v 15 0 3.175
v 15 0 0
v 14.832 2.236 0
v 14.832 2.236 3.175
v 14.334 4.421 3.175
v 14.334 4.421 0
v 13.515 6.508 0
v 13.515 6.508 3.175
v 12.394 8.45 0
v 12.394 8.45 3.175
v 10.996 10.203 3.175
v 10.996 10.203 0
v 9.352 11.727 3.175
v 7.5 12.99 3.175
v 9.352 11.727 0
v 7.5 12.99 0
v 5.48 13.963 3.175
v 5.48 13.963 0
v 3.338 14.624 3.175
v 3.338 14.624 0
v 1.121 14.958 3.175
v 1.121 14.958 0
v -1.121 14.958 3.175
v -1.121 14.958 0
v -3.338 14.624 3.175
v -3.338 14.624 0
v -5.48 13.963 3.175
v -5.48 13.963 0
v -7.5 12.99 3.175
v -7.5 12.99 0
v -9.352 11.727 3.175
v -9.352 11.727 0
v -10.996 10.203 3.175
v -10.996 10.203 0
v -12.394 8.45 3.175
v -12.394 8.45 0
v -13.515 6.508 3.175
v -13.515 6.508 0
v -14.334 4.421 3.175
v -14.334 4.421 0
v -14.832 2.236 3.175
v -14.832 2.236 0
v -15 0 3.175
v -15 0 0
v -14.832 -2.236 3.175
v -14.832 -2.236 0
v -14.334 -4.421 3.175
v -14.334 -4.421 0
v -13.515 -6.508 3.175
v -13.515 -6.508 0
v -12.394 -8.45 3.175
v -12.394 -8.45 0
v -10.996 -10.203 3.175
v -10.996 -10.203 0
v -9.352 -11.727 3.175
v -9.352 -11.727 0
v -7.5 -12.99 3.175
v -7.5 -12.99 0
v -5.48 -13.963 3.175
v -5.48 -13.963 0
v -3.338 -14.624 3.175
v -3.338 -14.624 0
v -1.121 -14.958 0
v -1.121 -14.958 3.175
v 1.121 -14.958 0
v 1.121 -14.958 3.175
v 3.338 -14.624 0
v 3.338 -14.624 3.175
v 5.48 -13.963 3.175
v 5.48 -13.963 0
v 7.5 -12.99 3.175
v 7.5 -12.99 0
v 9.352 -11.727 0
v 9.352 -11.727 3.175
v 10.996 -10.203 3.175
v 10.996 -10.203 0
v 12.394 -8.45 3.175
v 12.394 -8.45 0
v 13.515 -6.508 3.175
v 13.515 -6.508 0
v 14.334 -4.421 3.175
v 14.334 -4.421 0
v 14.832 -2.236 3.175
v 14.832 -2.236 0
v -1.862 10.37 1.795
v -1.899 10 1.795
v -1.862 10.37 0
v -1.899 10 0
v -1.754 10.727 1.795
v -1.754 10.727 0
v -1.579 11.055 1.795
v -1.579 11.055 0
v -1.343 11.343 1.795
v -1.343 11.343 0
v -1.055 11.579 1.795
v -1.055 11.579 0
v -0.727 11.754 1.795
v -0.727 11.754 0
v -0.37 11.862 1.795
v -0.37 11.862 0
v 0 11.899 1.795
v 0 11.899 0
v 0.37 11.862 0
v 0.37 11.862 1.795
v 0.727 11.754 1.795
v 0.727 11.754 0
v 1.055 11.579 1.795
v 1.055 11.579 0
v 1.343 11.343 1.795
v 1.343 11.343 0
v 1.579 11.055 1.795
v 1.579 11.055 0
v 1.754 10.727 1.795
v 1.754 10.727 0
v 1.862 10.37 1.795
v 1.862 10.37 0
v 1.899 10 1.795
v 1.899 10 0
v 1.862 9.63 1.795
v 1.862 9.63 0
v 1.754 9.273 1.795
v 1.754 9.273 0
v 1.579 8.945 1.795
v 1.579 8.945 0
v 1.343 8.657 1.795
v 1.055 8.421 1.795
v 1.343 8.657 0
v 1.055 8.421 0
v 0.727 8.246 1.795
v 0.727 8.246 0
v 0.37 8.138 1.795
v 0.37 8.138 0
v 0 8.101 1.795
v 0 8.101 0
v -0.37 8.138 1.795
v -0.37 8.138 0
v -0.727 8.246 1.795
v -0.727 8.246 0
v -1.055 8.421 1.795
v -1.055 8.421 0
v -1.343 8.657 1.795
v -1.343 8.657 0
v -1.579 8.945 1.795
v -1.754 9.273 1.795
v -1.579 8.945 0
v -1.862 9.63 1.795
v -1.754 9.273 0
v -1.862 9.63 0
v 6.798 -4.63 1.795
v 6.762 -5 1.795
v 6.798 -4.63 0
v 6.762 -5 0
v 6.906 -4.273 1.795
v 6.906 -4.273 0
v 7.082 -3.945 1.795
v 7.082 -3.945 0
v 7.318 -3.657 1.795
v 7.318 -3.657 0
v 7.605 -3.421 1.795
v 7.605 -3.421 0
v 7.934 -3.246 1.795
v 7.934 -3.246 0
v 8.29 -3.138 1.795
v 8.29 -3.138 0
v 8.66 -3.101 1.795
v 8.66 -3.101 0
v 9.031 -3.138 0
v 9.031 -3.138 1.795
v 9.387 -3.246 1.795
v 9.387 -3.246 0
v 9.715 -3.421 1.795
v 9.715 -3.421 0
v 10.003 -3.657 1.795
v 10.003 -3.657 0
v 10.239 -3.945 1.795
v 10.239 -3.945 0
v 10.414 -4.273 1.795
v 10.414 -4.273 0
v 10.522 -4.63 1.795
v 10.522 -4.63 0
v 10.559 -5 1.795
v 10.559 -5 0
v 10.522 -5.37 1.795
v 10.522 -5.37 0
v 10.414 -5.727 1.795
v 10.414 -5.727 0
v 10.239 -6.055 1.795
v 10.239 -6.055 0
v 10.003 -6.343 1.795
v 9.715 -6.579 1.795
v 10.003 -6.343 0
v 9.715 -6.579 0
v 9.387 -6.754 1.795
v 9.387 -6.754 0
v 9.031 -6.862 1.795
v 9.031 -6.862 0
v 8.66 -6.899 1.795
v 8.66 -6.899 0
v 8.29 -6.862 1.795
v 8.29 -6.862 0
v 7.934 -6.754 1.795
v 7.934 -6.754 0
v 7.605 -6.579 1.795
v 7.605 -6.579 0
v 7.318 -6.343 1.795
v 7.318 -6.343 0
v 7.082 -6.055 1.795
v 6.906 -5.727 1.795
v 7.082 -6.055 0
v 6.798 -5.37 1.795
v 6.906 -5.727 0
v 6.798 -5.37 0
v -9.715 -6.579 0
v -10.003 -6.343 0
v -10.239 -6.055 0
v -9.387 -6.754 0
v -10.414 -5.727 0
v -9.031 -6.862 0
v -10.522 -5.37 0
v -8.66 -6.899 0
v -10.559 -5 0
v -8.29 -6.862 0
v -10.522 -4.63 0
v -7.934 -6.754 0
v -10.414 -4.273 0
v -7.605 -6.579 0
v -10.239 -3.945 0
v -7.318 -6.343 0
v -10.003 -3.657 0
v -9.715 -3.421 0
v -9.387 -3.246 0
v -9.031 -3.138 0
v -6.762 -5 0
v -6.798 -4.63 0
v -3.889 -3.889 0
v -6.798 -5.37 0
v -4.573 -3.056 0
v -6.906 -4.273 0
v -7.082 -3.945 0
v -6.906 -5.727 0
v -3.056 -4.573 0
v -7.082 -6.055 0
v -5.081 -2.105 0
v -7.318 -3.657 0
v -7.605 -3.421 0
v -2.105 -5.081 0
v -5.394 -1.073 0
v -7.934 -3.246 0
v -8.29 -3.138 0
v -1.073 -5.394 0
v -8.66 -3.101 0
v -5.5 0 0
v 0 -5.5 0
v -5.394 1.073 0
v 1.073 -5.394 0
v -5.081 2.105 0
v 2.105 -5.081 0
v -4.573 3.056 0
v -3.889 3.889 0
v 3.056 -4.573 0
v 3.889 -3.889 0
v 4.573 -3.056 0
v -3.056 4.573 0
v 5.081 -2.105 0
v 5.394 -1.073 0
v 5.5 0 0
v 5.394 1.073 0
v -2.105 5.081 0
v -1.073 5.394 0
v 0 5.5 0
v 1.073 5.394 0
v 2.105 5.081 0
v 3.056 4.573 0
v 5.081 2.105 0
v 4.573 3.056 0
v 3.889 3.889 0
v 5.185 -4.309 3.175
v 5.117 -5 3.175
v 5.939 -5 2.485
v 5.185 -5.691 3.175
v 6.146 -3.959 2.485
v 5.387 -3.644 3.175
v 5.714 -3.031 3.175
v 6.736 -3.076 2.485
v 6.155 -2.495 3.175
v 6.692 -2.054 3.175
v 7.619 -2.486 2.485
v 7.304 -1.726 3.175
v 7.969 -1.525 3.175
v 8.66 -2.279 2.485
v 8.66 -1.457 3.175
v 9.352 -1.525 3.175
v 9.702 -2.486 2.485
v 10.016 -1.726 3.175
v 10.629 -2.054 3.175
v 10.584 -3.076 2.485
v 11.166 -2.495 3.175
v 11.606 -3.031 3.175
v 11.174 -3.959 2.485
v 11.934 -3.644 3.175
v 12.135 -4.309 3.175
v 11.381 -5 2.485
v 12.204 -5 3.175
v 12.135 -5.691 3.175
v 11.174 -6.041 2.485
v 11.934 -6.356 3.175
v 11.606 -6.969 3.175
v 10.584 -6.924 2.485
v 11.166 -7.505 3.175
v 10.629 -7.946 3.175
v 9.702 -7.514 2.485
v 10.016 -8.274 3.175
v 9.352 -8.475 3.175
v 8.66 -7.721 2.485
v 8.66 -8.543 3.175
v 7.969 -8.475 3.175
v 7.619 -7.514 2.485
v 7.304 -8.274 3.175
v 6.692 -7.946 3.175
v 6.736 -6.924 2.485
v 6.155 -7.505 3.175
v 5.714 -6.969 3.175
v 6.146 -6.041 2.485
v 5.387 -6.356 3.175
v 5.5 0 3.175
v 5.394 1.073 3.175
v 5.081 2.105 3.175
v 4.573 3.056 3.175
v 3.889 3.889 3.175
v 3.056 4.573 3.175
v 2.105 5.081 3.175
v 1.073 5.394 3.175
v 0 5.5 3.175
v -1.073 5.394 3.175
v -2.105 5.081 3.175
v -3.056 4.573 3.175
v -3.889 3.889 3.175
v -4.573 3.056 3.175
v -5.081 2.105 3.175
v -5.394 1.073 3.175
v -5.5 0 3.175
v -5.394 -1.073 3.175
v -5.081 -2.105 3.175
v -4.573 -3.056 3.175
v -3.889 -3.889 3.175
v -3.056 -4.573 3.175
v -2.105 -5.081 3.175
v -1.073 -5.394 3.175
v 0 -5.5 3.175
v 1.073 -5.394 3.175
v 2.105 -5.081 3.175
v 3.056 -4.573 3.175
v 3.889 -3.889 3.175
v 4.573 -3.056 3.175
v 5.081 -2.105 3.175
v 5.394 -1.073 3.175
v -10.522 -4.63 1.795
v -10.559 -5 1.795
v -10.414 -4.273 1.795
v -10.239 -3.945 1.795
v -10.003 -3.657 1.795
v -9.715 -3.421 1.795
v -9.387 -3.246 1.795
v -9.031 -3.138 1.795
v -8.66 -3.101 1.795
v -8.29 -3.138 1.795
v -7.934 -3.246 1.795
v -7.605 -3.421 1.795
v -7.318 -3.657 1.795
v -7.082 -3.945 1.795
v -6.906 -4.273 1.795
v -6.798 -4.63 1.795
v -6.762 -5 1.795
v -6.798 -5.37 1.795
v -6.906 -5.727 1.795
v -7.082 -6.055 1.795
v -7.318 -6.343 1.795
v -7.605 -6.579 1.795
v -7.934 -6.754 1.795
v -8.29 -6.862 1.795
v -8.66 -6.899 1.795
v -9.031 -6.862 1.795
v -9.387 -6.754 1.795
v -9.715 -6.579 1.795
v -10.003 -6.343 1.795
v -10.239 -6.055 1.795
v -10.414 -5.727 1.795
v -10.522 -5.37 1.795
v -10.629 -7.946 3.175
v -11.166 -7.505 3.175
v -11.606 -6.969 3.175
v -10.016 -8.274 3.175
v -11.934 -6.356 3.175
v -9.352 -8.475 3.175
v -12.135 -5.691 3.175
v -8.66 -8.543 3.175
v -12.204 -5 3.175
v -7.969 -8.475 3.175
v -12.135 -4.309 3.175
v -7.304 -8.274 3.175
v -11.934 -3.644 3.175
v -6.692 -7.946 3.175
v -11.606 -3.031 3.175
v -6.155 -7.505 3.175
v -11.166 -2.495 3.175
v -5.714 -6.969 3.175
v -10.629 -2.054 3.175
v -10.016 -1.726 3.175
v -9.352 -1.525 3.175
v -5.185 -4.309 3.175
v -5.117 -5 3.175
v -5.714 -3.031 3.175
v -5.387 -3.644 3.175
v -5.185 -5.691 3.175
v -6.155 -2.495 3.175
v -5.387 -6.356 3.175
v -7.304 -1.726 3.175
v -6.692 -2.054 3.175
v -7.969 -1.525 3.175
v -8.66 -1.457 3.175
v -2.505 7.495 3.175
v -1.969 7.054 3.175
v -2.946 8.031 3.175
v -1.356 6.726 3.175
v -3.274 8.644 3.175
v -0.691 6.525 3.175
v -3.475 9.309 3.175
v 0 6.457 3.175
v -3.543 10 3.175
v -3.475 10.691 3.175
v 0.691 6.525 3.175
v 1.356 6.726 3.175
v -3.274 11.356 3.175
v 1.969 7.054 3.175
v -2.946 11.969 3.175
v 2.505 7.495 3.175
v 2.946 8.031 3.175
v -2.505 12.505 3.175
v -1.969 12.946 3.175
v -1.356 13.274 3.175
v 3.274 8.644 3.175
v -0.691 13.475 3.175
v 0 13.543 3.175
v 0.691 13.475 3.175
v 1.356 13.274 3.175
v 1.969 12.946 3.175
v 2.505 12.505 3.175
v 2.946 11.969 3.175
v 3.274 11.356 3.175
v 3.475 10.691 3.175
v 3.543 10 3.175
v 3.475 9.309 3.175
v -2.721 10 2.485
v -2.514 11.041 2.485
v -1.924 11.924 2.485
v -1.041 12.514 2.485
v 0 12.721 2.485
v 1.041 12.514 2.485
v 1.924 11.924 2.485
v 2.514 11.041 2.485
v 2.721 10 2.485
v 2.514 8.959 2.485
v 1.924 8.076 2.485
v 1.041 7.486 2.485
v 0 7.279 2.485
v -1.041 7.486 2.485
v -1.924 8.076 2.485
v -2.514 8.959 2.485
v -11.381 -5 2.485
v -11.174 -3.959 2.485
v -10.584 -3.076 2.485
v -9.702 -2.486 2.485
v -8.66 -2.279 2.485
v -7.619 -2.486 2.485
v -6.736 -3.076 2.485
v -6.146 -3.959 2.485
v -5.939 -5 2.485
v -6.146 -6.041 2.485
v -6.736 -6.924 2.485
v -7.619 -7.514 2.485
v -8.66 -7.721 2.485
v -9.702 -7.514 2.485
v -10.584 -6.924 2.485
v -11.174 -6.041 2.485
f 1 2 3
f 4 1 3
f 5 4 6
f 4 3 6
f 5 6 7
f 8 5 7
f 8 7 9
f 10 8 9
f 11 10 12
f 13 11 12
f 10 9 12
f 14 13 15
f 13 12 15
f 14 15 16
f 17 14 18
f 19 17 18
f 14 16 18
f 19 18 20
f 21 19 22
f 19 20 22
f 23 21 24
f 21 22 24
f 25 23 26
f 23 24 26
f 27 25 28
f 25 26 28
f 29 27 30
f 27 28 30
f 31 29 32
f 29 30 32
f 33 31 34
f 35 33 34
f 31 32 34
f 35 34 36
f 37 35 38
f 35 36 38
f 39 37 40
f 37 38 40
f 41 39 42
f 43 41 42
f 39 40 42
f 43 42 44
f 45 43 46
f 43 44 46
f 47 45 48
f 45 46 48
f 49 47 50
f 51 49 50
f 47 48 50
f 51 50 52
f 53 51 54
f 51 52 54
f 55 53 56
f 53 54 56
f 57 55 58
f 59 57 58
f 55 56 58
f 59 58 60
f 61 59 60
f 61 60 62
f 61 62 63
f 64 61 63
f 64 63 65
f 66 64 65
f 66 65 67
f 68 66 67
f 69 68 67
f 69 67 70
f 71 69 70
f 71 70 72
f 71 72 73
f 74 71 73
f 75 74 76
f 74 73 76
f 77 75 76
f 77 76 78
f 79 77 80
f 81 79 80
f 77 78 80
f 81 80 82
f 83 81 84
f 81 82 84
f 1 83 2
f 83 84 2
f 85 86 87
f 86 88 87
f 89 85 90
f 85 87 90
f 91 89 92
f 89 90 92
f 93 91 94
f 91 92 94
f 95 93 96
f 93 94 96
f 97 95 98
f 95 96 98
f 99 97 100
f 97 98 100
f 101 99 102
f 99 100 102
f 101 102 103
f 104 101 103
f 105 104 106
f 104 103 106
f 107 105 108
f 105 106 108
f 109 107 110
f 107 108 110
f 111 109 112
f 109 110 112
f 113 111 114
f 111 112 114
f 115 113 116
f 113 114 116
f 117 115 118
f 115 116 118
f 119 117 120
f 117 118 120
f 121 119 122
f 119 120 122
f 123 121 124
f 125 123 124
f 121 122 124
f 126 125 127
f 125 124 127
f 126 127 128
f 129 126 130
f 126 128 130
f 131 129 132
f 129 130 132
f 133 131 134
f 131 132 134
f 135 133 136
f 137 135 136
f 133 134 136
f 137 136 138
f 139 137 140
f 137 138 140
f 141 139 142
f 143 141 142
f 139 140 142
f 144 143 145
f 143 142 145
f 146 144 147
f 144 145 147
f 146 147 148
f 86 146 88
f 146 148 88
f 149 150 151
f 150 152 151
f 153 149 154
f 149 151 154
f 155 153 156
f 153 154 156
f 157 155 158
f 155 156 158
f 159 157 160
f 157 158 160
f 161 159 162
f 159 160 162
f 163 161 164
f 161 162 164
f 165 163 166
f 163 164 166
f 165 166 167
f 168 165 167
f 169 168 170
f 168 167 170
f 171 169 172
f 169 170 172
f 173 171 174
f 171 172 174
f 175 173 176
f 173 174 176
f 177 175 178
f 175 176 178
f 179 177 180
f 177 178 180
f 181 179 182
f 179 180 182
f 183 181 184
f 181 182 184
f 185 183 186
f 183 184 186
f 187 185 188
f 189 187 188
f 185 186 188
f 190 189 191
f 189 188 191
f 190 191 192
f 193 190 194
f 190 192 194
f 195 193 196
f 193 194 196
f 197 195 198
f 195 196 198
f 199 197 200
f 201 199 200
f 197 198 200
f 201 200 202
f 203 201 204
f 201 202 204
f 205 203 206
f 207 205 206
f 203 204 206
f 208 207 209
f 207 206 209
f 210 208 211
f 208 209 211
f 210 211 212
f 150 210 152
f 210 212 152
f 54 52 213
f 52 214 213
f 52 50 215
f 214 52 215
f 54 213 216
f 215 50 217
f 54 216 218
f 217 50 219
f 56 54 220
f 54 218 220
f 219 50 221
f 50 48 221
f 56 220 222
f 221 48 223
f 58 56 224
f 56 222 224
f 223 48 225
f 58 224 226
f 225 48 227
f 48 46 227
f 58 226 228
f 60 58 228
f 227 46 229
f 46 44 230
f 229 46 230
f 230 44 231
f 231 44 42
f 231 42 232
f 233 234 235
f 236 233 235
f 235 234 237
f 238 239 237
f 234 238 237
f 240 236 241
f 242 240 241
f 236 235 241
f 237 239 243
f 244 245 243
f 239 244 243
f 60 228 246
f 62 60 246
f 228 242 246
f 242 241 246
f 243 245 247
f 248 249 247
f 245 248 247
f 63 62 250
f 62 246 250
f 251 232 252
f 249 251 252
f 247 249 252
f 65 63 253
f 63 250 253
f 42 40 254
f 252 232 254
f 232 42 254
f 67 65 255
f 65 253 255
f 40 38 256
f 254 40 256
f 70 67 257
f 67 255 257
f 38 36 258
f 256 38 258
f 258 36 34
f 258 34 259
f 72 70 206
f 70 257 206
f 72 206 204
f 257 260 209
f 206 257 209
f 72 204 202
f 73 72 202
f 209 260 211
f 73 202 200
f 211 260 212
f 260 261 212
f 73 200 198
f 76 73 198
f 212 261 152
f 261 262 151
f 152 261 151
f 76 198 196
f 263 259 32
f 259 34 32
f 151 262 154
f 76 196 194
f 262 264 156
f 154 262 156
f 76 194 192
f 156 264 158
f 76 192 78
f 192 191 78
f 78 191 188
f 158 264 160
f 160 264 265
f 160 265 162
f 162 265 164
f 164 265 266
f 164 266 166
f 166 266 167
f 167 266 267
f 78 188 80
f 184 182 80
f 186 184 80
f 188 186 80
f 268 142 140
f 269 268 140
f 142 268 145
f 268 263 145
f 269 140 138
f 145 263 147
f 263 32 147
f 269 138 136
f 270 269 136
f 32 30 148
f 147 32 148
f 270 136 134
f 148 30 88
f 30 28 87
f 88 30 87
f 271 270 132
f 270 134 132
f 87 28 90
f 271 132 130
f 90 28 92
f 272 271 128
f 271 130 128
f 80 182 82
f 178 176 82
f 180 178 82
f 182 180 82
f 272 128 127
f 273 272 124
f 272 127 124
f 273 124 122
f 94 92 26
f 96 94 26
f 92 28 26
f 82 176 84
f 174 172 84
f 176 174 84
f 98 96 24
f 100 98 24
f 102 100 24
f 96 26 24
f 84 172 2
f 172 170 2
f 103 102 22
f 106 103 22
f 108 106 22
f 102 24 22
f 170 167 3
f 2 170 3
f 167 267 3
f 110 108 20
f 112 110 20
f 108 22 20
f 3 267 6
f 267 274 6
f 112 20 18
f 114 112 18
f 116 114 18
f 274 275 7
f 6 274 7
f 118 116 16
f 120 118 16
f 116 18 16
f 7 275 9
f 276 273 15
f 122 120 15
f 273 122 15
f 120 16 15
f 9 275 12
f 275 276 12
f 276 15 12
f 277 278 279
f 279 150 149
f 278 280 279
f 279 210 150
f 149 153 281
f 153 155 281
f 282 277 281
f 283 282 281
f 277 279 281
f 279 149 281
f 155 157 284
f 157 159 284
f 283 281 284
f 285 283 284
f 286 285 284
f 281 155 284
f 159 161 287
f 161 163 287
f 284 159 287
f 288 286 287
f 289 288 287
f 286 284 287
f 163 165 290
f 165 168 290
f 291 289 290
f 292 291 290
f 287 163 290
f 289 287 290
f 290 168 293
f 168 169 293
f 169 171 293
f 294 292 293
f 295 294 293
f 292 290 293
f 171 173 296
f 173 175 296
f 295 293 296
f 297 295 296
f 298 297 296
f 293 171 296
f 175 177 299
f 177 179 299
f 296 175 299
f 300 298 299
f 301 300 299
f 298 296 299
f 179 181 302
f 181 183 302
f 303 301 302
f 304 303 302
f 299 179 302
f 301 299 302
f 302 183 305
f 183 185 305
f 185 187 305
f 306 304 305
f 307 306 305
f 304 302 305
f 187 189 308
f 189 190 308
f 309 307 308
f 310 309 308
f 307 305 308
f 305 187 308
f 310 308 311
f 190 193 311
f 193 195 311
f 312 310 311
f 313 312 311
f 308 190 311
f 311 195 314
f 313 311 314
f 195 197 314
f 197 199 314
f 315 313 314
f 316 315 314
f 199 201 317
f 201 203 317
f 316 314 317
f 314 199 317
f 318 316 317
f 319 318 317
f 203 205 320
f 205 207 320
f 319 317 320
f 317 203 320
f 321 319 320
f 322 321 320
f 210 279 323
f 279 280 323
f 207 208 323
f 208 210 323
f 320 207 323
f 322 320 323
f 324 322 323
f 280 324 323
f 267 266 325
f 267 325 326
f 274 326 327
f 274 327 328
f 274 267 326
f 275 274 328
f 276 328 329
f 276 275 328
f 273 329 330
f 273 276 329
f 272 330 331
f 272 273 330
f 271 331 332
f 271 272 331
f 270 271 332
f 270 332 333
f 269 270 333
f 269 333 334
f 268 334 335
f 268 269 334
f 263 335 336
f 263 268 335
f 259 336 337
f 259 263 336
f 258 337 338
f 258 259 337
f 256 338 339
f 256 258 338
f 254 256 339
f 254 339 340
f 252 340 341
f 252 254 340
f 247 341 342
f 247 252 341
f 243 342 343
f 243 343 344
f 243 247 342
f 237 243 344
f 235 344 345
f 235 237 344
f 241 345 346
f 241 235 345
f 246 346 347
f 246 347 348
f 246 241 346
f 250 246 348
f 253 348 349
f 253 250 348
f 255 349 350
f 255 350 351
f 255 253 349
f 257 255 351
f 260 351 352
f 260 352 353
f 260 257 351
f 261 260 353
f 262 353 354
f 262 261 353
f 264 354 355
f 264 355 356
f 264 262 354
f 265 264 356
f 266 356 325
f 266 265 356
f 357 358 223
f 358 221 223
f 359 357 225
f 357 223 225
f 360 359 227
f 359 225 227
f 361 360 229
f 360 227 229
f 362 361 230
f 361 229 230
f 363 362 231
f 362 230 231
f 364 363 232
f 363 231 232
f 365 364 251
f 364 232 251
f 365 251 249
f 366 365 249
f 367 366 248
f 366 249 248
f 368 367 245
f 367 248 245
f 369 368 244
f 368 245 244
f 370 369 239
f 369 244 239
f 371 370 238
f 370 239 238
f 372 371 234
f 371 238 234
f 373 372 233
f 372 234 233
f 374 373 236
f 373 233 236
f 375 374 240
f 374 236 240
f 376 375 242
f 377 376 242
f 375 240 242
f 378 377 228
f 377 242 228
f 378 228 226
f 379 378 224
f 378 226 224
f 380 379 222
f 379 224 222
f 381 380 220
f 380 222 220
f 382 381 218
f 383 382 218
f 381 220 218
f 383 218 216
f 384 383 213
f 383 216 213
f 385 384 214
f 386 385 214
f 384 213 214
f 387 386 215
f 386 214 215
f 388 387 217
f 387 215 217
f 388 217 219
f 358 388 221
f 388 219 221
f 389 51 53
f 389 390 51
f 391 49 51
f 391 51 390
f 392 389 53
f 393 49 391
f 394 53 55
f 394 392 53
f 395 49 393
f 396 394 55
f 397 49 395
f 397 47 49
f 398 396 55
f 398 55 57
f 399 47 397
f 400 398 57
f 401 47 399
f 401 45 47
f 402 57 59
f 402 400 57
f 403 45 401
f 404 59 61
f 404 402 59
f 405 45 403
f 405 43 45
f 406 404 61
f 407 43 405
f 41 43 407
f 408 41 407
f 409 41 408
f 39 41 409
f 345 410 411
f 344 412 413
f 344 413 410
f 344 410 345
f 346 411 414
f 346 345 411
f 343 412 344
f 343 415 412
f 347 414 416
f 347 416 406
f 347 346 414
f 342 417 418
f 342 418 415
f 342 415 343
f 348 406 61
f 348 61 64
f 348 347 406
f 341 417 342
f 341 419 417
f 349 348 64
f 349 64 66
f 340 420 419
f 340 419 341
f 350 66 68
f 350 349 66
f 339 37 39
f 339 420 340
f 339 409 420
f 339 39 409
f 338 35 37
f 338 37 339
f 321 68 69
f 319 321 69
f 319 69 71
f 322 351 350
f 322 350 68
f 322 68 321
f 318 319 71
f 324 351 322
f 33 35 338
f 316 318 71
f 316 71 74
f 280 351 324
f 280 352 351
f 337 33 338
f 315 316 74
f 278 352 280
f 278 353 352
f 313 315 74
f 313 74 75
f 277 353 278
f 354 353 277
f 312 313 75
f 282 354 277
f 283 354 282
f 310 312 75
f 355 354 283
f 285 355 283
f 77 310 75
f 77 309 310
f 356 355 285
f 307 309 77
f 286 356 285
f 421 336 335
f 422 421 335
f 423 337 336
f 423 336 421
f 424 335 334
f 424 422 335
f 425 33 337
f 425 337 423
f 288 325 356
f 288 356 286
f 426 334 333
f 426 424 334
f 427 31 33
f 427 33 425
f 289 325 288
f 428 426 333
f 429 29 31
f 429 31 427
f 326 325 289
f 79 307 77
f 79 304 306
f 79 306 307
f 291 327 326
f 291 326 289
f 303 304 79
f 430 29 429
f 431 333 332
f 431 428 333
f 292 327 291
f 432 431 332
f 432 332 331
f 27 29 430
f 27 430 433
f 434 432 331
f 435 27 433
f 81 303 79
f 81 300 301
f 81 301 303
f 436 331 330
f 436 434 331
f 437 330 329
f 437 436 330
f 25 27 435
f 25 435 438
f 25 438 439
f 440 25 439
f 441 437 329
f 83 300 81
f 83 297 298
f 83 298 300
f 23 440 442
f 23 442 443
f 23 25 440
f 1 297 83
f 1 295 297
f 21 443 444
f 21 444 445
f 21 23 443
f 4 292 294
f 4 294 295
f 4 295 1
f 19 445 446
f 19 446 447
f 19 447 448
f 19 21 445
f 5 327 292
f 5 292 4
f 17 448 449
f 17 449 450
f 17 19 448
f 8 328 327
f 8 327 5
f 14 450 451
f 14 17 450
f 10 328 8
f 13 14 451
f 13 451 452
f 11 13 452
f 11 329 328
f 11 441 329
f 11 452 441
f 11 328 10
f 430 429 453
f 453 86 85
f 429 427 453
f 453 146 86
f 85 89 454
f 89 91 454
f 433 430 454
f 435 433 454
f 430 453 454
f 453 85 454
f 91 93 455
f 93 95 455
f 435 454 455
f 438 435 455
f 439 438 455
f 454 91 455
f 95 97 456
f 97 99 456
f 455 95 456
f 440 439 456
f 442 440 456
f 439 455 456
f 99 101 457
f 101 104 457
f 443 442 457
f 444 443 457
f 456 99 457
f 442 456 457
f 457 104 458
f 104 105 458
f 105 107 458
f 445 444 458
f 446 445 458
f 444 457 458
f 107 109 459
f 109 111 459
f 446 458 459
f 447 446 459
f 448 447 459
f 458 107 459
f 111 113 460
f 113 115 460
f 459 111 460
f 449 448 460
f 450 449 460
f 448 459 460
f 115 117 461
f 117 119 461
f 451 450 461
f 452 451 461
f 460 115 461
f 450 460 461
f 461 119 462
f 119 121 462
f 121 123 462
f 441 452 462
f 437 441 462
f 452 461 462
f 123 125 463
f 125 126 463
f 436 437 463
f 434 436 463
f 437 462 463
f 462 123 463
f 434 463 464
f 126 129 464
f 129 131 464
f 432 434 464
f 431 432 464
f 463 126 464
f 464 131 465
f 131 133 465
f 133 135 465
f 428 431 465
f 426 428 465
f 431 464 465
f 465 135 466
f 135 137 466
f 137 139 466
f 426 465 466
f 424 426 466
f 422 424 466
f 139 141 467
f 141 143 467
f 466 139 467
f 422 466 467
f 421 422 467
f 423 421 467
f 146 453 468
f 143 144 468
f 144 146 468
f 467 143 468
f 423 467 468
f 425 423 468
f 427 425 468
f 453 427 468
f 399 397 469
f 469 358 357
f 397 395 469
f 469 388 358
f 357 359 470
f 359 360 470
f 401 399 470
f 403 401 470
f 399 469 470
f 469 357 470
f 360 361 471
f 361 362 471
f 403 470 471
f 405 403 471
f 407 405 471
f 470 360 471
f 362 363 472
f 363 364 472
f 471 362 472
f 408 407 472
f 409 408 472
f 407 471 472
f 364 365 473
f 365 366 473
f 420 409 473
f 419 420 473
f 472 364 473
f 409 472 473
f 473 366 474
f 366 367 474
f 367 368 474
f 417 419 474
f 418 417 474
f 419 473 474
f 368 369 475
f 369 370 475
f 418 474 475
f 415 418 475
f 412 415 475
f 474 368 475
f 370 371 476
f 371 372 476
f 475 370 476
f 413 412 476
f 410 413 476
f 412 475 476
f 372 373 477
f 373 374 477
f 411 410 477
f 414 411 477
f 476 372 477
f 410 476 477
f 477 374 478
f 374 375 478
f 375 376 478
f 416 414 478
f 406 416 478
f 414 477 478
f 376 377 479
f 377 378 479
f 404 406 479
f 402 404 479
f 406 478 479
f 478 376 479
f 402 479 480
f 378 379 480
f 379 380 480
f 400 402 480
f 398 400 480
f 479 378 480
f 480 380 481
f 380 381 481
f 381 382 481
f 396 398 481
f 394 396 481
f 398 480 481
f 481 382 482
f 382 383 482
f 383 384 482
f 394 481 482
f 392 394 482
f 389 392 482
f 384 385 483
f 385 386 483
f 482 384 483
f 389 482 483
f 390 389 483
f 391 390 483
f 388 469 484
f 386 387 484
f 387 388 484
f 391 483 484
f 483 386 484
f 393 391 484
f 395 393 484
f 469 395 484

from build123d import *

# Parameters (mm, degrees)
SKETCH1_R                                         = 15
SKETCH1_R_2                                       = 5.5
BODY_DEPTH                                        = 3.175
CSK_FOR_6_FLAT_HEAD_MACHINE_SCREW_100_D           = 3.7973
CSK_FOR_6_FLAT_HEAD_MACHINE_SCREW_100_CSINK_D     = 7.0866
CSK_FOR_6_FLAT_HEAD_MACHINE_SCREW_100_CSINK_ANGLE = 100


with BuildPart() as part:
    # Sketch1 → Body (new body)
    with BuildSketch(Plane.XY):
        Circle(SKETCH1_R)
        Circle(SKETCH1_R_2, mode=Mode.SUBTRACT)
    extrude(amount=BODY_DEPTH)

    # CSK for #6 Flat Head Machine Screw (100)1 (through all)
    with Locations(Plane(origin=(0, 10, 3.175), x_dir=(1, 0, 0), z_dir=(0, 0, 1))):
        with Locations((0, 0), (-8.660254038, -15), (8.660254038, -15)):
            CounterSinkHole(CSK_FOR_6_FLAT_HEAD_MACHINE_SCREW_100_D / 2, CSK_FOR_6_FLAT_HEAD_MACHINE_SCREW_100_CSINK_D / 2, counter_sink_angle=CSK_FOR_6_FLAT_HEAD_MACHINE_SCREW_100_CSINK_ANGLE)


solid = part.part
